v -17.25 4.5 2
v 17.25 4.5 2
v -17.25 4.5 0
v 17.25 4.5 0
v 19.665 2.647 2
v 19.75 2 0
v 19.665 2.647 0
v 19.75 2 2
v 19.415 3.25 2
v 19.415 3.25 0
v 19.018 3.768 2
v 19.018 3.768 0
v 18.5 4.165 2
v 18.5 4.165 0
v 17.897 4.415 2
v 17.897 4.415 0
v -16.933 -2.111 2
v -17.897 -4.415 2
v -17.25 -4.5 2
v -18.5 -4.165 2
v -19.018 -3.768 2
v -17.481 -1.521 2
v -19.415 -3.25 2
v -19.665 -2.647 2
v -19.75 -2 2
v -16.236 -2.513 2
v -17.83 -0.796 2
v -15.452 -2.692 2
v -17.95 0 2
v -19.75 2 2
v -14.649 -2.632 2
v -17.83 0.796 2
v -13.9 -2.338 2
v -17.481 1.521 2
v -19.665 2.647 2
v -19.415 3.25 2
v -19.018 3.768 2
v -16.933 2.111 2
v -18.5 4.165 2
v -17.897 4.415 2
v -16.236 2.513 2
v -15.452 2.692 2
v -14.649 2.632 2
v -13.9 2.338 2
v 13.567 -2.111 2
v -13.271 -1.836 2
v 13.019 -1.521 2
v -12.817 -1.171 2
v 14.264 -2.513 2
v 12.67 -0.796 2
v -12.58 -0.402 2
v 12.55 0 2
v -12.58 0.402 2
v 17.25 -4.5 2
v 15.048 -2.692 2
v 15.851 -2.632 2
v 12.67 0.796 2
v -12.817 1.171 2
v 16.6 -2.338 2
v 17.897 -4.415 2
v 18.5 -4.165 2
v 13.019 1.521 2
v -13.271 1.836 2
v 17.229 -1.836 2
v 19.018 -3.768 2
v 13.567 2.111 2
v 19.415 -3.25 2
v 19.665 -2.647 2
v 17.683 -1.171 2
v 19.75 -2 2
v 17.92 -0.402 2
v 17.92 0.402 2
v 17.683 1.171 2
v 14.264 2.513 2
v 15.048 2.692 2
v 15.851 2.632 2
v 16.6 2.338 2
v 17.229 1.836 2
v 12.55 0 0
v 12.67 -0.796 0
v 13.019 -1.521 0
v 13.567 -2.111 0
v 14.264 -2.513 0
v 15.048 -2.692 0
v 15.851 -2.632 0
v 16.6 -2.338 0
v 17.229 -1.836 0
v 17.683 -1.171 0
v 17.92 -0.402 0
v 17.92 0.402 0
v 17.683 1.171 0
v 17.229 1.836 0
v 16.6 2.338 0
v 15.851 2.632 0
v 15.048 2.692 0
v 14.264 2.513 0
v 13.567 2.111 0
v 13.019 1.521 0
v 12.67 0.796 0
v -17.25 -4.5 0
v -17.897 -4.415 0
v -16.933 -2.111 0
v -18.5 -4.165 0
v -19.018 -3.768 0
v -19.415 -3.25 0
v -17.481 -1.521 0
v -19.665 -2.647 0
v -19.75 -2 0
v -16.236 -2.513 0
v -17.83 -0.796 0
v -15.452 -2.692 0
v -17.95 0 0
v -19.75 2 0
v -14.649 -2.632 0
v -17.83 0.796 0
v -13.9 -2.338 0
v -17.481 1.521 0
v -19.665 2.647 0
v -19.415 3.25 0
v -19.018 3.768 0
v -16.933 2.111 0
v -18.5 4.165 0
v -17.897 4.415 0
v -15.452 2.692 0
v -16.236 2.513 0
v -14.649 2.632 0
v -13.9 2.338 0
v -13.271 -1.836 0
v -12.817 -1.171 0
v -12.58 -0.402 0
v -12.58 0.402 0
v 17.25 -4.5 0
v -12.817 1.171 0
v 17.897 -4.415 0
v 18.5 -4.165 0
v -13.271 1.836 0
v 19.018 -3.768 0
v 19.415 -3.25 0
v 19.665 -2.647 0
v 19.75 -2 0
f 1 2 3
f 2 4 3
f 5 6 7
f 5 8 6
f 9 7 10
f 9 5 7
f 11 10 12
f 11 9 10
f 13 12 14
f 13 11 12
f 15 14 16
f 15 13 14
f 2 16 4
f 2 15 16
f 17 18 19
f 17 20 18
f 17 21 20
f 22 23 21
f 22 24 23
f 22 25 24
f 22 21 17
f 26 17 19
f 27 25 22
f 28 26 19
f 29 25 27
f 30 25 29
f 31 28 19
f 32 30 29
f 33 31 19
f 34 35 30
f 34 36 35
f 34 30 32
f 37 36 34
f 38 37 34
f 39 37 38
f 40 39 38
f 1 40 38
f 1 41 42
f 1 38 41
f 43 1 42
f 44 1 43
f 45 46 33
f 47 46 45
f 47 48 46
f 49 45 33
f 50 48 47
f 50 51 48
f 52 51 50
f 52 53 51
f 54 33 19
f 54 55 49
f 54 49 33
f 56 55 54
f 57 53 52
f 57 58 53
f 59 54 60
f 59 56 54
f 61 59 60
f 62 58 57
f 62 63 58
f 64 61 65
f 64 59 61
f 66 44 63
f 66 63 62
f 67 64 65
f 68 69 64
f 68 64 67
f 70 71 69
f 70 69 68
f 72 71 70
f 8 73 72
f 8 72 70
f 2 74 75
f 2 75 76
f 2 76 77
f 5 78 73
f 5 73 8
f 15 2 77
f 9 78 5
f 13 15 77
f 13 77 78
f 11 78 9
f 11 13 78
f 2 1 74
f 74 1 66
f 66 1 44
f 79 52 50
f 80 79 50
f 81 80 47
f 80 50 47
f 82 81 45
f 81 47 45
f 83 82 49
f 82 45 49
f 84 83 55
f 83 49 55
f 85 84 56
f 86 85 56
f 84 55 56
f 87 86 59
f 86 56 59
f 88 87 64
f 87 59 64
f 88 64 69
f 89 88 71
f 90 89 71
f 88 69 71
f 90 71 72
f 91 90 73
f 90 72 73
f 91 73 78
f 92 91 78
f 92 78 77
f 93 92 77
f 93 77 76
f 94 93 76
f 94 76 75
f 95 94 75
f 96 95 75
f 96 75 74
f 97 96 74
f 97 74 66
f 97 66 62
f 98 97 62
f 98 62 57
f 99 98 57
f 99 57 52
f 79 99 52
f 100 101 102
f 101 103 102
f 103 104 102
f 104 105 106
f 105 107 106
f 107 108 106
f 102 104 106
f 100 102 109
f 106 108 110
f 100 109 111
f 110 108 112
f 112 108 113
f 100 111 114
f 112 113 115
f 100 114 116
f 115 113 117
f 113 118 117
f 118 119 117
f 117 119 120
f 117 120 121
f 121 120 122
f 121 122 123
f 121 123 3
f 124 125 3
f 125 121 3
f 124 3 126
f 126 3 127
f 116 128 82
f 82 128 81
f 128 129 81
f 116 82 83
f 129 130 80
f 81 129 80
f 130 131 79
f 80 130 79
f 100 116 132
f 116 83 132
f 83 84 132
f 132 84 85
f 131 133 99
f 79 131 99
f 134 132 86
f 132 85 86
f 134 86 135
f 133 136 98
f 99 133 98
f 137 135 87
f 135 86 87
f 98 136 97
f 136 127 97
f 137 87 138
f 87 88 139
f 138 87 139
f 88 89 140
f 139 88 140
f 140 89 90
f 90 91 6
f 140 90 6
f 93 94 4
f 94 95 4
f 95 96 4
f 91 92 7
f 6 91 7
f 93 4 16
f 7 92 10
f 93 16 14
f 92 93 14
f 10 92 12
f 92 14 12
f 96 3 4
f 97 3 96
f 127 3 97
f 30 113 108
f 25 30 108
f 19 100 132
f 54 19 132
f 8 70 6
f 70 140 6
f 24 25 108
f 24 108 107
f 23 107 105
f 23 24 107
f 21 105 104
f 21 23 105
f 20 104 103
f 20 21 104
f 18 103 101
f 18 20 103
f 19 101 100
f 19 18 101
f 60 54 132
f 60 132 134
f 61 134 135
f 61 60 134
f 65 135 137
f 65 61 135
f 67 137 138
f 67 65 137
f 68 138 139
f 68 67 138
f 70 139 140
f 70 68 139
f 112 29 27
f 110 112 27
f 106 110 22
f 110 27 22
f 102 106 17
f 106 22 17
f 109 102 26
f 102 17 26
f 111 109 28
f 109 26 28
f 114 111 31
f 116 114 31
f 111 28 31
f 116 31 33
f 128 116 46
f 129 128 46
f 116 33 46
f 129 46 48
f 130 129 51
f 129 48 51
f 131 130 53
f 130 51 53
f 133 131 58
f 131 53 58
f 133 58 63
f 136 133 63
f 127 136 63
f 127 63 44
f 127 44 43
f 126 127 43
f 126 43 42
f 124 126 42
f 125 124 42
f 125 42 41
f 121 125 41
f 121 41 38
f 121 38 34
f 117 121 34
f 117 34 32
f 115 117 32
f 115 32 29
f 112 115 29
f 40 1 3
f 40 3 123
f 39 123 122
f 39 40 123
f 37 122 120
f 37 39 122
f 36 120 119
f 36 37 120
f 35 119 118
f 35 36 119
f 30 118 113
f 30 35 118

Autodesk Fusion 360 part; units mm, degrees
sketch "Sketch1" plane through (0, 0, 0) normal (0, 0, 1) x (1, 0, 0)
  line L0 (19.75, 4.5) -> (-19.75, 4.5)
  line L1 (-19.75, 4.5) -> (-19.75, -4.5)
  line L2 (-19.75, -4.5) -> (19.75, -4.5)
  line L3 (19.75, -4.5) -> (19.75, 4.5)
  line L4 (19.75, 4.5) -> (-19.75, -4.5) construction
  line L5 (-19.75, 4.5) -> (19.75, -4.5) construction
  dimension "d1" = 39.5
  dimension "d2" = 9
extrude "Extrude1" add sketch "Sketch1" along normal blind 2
fillet "Fillet1" radius 2.5 4 edges at (-19.75, -4.5, 1) (-19.75, 4.5, 1) (19.75, 4.5, 1) (19.75, -4.5, 1)
sketch "Sketch2" plane through (0, 0, 2) normal (0, 0, 1) x (-1, 0, 0)
  arc A0 (-17.25, 4.5) -> (-19.75, 2) centre (-17.25, 2) ccw
  line L0 (-17.25, -4.5) -> (17.25, -4.5)
  arc A1 (17.25, -4.5) -> (19.75, -2) centre (17.25, -2) ccw
  line L1 (17.25, 4.5) -> (-17.25, 4.5)
  line L2 (-19.75, 2) -> (-19.75, -2)
  arc A2 (-19.75, -2) -> (-17.25, -4.5) centre (-17.25, -2) ccw
  line L3 (19.75, -2) -> (19.75, 2)
  arc A3 (19.75, 2) -> (17.25, 4.5) centre (17.25, 2) ccw
  line L4 (19.75, 0) -> (-19.75, 0) construction
  line L5 (19.75, 0) -> (15.25, 0)
  line L6 (-19.75, 0) -> (-15.25, 0)
  circle A4 centre (15.25, 0) radius 2.7
  circle A5 centre (-15.25, 0) radius 2.7
  dimension "d11" = 4.5
  dimension "d12" = 4.5
  dimension "d13" = 5.4
  dimension "d14" = 5.4
extrude "Extrude2" cut sketch "Sketch2" against normal blind 3 contours A5 | A4
